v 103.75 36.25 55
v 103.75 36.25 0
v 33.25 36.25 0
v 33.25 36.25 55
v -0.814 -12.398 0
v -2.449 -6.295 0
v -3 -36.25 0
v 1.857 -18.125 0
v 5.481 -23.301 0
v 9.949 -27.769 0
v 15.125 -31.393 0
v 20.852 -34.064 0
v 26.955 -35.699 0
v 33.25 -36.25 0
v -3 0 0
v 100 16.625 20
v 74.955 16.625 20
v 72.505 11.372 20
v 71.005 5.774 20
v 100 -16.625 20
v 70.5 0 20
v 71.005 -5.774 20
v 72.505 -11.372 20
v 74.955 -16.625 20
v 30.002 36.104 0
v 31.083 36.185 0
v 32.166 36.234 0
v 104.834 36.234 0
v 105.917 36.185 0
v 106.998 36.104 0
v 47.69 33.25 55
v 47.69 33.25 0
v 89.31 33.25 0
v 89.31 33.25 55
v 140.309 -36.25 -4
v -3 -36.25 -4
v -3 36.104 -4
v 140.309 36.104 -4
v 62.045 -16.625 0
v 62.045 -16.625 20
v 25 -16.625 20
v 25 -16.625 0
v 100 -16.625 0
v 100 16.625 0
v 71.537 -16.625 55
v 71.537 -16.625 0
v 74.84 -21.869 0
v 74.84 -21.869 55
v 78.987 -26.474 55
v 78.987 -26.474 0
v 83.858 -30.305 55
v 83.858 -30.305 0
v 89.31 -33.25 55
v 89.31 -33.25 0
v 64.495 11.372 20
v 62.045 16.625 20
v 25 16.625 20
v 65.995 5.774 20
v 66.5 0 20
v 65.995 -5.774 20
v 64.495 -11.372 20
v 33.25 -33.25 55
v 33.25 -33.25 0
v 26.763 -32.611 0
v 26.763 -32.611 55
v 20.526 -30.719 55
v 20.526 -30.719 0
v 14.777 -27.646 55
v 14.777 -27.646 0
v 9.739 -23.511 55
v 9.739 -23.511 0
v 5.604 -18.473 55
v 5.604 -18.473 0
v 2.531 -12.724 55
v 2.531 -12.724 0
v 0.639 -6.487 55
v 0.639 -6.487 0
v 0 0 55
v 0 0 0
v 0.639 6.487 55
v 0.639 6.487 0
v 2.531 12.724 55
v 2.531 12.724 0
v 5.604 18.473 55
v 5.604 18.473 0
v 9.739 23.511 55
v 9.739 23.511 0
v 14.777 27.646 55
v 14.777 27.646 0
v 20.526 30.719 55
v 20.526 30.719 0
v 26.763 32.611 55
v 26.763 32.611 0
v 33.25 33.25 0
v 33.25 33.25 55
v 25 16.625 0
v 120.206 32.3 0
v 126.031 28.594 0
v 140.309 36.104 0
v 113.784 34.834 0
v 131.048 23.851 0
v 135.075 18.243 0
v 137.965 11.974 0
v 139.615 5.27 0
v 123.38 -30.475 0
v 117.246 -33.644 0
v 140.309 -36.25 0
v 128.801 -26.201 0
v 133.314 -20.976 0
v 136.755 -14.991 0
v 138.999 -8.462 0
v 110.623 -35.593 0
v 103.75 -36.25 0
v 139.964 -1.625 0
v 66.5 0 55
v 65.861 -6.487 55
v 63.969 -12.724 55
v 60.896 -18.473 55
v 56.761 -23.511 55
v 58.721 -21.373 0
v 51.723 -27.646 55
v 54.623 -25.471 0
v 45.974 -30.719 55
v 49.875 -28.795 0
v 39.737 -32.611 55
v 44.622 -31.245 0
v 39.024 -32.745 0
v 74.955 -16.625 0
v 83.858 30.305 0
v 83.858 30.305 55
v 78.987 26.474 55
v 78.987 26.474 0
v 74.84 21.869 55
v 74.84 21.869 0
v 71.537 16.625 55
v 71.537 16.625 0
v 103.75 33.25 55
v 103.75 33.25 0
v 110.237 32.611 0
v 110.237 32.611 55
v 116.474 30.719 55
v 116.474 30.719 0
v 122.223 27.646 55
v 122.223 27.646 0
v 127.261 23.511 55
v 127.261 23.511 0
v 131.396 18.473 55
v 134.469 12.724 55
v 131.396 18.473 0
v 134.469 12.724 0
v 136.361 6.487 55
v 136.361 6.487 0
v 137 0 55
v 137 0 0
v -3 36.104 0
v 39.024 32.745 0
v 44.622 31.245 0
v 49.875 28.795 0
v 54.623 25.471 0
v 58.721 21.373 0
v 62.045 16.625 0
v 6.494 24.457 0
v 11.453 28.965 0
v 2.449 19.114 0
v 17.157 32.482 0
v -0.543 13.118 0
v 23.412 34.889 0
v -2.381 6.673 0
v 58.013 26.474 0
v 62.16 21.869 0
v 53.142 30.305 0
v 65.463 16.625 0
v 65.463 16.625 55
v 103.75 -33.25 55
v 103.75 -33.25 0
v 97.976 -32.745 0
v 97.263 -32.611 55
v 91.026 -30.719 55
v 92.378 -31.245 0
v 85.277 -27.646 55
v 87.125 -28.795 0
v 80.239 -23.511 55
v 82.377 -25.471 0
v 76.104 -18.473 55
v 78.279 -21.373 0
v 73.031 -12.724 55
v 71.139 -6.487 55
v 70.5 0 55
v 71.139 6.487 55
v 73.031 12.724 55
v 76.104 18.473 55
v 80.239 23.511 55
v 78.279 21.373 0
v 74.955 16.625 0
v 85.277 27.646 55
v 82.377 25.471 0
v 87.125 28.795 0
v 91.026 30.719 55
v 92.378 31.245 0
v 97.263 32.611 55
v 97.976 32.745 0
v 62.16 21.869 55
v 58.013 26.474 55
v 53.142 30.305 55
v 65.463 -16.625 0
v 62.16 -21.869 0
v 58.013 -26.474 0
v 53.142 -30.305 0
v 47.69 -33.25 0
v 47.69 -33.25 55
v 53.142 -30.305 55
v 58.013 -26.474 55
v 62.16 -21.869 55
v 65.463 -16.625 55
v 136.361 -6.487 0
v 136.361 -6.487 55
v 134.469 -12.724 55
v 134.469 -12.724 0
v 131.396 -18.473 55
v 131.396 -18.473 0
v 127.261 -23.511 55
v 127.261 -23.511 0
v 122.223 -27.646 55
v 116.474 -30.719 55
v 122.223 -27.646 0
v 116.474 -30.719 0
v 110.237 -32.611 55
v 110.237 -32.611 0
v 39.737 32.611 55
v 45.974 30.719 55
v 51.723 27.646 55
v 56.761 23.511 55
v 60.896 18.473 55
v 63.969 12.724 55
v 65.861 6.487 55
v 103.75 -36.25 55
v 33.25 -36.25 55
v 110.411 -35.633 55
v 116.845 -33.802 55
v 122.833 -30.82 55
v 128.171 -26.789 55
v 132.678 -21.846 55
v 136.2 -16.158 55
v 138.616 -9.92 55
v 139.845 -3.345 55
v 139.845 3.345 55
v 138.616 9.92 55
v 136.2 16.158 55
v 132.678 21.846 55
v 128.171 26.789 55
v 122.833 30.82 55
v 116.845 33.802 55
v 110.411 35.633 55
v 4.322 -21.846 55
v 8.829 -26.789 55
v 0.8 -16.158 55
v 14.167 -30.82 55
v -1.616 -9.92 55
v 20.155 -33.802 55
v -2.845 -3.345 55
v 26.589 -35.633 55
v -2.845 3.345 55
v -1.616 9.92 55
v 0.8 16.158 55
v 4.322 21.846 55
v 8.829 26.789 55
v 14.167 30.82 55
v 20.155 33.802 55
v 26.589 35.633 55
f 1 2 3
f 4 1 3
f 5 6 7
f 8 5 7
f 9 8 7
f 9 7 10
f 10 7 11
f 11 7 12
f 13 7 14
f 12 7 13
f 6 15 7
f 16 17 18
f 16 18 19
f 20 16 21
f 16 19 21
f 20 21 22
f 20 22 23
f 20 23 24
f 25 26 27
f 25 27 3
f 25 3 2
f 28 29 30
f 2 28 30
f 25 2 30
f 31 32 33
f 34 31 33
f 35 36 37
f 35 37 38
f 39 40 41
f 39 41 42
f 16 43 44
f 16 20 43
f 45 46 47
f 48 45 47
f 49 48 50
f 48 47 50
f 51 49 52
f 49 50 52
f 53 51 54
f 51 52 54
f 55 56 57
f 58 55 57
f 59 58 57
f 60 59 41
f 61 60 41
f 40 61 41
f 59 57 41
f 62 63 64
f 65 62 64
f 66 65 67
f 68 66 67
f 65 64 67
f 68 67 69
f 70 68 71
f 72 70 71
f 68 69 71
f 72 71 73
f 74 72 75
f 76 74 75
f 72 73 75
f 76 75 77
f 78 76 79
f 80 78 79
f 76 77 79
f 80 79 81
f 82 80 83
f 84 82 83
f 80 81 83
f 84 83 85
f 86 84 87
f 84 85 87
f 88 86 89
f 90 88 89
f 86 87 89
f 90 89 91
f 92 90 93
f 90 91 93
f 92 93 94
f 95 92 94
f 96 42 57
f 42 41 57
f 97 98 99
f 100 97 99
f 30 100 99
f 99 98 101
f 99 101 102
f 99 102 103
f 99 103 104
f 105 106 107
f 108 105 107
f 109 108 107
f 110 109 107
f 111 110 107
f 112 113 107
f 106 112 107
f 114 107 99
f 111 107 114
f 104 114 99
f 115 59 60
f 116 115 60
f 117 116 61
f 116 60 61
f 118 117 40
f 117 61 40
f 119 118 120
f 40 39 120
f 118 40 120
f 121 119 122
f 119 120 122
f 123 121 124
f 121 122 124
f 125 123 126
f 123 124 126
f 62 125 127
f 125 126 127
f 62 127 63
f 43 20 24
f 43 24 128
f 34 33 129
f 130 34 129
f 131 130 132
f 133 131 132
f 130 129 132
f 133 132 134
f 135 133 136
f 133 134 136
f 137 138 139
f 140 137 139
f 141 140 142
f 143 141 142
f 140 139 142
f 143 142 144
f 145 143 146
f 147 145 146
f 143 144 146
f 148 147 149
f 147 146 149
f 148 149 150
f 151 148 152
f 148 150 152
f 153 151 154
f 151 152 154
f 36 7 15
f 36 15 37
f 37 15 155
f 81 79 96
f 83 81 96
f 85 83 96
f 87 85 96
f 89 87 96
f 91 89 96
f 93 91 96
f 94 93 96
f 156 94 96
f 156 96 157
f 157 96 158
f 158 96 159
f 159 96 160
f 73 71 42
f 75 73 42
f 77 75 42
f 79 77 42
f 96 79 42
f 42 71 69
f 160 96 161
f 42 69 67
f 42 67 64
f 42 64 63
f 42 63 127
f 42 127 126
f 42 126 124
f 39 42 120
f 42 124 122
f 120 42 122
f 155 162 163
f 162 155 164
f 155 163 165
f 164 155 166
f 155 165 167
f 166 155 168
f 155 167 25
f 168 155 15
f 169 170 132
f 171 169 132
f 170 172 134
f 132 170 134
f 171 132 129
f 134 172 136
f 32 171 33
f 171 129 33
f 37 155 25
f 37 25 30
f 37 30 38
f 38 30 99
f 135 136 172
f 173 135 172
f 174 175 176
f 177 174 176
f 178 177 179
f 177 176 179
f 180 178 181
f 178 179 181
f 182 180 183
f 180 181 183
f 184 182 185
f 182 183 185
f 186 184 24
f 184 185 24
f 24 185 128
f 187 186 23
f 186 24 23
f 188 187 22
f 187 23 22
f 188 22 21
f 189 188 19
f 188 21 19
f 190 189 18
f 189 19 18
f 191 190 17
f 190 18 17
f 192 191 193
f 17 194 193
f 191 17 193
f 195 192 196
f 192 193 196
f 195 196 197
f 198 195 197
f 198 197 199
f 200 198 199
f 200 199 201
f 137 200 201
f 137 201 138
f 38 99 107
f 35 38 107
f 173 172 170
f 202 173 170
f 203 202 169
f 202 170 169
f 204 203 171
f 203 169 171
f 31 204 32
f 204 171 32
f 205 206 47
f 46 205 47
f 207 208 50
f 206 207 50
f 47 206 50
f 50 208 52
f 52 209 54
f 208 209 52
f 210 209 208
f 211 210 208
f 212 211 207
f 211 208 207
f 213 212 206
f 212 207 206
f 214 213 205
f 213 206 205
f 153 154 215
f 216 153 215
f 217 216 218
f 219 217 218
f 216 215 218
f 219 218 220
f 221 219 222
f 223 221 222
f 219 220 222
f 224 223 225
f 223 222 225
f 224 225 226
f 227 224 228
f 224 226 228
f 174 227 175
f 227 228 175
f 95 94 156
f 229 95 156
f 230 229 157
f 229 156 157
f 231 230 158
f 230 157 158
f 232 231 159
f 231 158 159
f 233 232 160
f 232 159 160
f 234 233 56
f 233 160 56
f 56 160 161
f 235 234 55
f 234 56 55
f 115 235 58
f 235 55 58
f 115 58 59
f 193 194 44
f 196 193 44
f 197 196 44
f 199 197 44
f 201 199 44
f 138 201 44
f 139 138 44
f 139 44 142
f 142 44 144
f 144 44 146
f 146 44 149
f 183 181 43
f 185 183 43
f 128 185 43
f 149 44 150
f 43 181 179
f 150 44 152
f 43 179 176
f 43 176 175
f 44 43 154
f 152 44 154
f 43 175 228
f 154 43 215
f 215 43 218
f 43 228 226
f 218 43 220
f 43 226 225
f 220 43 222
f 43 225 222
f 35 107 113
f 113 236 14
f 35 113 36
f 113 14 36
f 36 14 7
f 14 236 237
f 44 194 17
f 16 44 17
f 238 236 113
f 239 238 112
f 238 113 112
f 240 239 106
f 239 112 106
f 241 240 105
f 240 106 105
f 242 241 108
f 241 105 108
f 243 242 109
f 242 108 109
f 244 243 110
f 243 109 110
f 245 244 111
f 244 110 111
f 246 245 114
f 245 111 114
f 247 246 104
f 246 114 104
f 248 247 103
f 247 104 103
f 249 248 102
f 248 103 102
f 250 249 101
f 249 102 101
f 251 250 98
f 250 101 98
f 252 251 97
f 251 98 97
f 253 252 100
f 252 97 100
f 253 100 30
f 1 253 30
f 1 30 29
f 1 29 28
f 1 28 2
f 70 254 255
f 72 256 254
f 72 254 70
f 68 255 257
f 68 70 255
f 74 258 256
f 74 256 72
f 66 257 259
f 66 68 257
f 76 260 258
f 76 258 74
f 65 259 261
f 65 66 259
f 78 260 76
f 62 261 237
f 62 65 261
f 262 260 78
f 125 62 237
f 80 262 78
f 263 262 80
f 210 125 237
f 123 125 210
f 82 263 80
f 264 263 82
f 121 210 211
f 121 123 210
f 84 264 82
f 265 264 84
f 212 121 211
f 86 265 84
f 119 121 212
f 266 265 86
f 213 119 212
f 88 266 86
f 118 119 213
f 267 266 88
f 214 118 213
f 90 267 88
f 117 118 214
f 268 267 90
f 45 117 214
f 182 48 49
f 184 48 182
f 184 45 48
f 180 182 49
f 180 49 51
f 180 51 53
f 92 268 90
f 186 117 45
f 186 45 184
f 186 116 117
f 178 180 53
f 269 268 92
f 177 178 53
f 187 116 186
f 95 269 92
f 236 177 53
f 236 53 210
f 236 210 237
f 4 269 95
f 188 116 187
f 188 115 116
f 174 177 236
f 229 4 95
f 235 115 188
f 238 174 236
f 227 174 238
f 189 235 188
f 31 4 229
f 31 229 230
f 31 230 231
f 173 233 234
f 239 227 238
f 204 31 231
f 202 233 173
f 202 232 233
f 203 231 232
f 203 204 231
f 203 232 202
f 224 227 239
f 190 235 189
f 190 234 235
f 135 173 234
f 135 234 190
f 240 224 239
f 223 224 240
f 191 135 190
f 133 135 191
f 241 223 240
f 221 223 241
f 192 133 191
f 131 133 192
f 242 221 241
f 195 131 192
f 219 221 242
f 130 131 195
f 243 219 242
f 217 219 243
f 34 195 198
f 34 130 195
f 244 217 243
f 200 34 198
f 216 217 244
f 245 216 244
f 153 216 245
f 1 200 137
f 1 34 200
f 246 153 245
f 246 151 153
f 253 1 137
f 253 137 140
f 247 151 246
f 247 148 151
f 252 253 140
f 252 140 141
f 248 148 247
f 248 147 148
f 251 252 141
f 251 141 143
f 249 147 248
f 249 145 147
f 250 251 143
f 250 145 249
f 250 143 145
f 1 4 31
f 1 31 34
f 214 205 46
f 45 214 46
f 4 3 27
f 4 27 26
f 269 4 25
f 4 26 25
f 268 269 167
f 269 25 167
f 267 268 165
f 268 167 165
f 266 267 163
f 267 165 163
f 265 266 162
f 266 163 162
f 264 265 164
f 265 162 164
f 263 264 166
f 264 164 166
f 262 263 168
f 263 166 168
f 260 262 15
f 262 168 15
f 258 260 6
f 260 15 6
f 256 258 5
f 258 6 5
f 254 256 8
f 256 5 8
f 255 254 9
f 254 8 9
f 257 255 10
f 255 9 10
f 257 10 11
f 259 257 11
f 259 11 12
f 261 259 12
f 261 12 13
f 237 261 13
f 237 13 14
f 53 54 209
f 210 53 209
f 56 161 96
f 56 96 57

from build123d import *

# Parameters (mm, degrees)
F2_START = 25
F2_DEPTH = 75
F3_DEPTH = 55
F5_DEPTH = 4


with BuildPart() as f2:
    # F1 (on Right) → F2 (new body)
    with BuildSketch(Plane.YZ.offset(F2_START)):
        Polygon((-16.625, 0), (0, 0), (16.625, 0), (16.625, 20), (-16.625, 20), align=None)
    extrude(amount=F2_DEPTH)

    # F0 (on Top) → F3 (join)
    with BuildSketch(Plane.XY):
        with BuildLine():
            ThreePointArc((33.25, 36.25), (40.6239406019, 35.4920765806), (47.6895290782, 33.25))
            Line((47.6895290782, 33.25), (89.3104709218, 33.25))
            ThreePointArc((89.3104709218, 33.25), (96.3760593981, 35.4920765806), (103.75, 36.25))
            Line((103.75, 36.25), (33.25, 36.25))
        make_face()
        with BuildLine():
            ThreePointArc((65.4629147238, 16.625), (58.0130830961, 26.4736135723), (47.6895290782, 33.25))
            ThreePointArc((47.6895290782, 33.25), (40.6239406019, 35.4920765806), (33.25, 36.25))
            ThreePointArc((33.25, 36.25), (-3, 0), (33.25, -36.25))
            ThreePointArc((33.25, -36.25), (40.6239406019, -35.4920765806), (47.6895290782, -33.25))
            ThreePointArc((47.6895290782, -33.25), (58.0130830961, -26.4736135723), (65.4629147238, -16.625))
            Line((65.4629147238, -16.625), (71.5370852762, -16.625))
            ThreePointArc((71.5370852762, -16.625), (78.9869169039, -26.4736135723), (89.3104709218, -33.25))
            ThreePointArc((89.3104709218, -33.25), (96.3760593981, -35.4920765806), (103.75, -36.25))
            ThreePointArc((103.75, -36.25), (140, 0), (103.75, 36.25))
            ThreePointArc((103.75, 36.25), (96.3760593981, 35.4920765806), (89.3104709218, 33.25))
            ThreePointArc((89.3104709218, 33.25), (78.9869169039, 26.4736135723), (71.5370852762, 16.625))
            Line((71.5370852762, 16.625), (65.4629147238, 16.625))
        make_face()
        with BuildLine():
            ThreePointArc((33.25, -33.25), (0, 0), (33.25, 33.25))
            ThreePointArc((33.25, 33.25), (56.7613004745, 23.5113004745), (66.5, 0))
            ThreePointArc((66.5, 0), (56.7613004745, -23.5113004745), (33.25, -33.25))
        make_face(mode=Mode.SUBTRACT)
        with BuildLine():
            ThreePointArc((137, 0), (127.2613004745, -23.5113004745), (103.75, -33.25))
            ThreePointArc((103.75, -33.25), (70.5, 0), (103.75, 33.25))
            ThreePointArc((103.75, 33.25), (127.2613004745, 23.5113004745), (137, 0))
        make_face(mode=Mode.SUBTRACT)
        with BuildLine():
            ThreePointArc((47.6895290782, -33.25), (40.6239406019, -35.4920765806), (33.25, -36.25))
            Line((33.25, -36.25), (103.75, -36.25))
            ThreePointArc((103.75, -36.25), (96.3760593981, -35.4920765806), (89.3104709218, -33.25))
            Line((89.3104709218, -33.25), (47.6895290782, -33.25))
        make_face()
    extrude(amount=F3_DEPTH)

    # F4 (on face) → F5 (join)
    with BuildSketch(Plane(origin=(0, 0, 0), x_dir=(1, 0, 0), z_dir=(0, 0, -1))):
        with BuildLine():
            Line((103.75, 36.25), (33.25, 36.25))
            ThreePointArc((33.25, 36.25), (7.6173792195, 25.6326208556), (-3, 1.062e-07))
            ThreePointArc((-3, 1.062e-07), (6.493803342, -24.4574822989), (30.0023968175, -36.1042320728))
            Line((30.0023968175, -36.1042320728), (106.9976031825, -36.1042320728))
            ThreePointArc((106.9976031825, -36.1042320728), (139.9635396823, 1.6254364583), (103.75, 36.25))
        make_face()
        with BuildLine():
            ThreePointArc((47.6895290782, -33.25), (58.0130830961, -26.4736135723), (65.4629147238, -16.625))
            Line((65.4629147238, -16.625), (71.5370852762, -16.625))
            ThreePointArc((71.5370852762, -16.625), (78.9869169039, -26.4736135723), (89.3104709218, -33.25))
            Line((89.3104709218, -33.25), (47.6895290782, -33.25))
        make_face(mode=Mode.SUBTRACT)
        with BuildLine():
            Line((100, 16.625), (74.9546553242, 16.625))
            ThreePointArc((74.9546553242, 16.625), (132.5453446758, 16.625), (103.75, -33.25))
            ThreePointArc((103.75, -33.25), (87.125, -28.7953446758), (74.9546553242, -16.625))
            Line((74.9546553242, -16.625), (100, -16.625))
            Line((100, -16.625), (100, 16.625))
        make_face(mode=Mode.SUBTRACT)
        with BuildLine():
            Line((25, -16.625), (62.0453446758, -16.625))
            ThreePointArc((62.0453446758, -16.625), (4.4546553242, -16.625), (33.25, 33.25))
            ThreePointArc((33.25, 33.25), (49.875, 28.7953446758), (62.0453446758, 16.625))
            Line((62.0453446758, 16.625), (25, 16.625))
            Line((25, 16.625), (25, -16.625))
        make_face(mode=Mode.SUBTRACT)
        with BuildLine():
            ThreePointArc((89.3104709218, 33.25), (78.9869169039, 26.4736135723), (71.5370852762, 16.625))
            Line((71.5370852762, 16.625), (65.4629147238, 16.625))
            ThreePointArc((65.4629147238, 16.625), (58.0130830961, 26.4736135723), (47.6895290782, 33.25))
            Line((47.6895290782, 33.25), (89.3104709218, 33.25))
        make_face(mode=Mode.SUBTRACT)
        with BuildLine():
            Line((33.25, 36.25), (-3, 36.25))
            Line((-3, 36.25), (-3, 1.062e-07))
            ThreePointArc((-3, 1.062e-07), (7.6173792195, 25.6326208556), (33.25, 36.25))
        make_face()
        with BuildLine():
            Line((140.309497714, 36.25), (103.75, 36.25))
            ThreePointArc((103.75, 36.25), (139.9635396823, 1.6254364583), (106.9976031825, -36.1042320728))
            Line((106.9976031825, -36.1042320728), (140.309497714, -36.1042320728))
            Line((140.309497714, -36.1042320728), (140.309497714, 36.25))
        make_face()
        with BuildLine():
            Line((65.4629147238, 16.625), (71.5370852762, 16.625))
            ThreePointArc((71.5370852762, 16.625), (78.9869169039, 26.4736135723), (89.3104709218, 33.25))
            Line((89.3104709218, 33.25), (47.6895290782, 33.25))
            ThreePointArc((47.6895290782, 33.25), (58.0130830961, 26.4736135723), (65.4629147238, 16.625))
        make_face()
        with BuildLine():
            ThreePointArc((33.25, 33.25), (4.4546553242, -16.625), (62.0453446758, -16.625))
            Line((62.0453446758, -16.625), (25, -16.625))
            Line((25, -16.625), (25, 16.625))
            Line((25, 16.625), (62.0453446758, 16.625))
            ThreePointArc((62.0453446758, 16.625), (49.875, 28.7953446758), (33.25, 33.25))
        make_face()
        with BuildLine():
            ThreePointArc((103.75, -33.25), (132.5453446758, 16.625), (74.9546553242, 16.625))
            Line((74.9546553242, 16.625), (100, 16.625))
            Line((100, 16.625), (100, -16.625))
            Line((100, -16.625), (74.9546553242, -16.625))
            ThreePointArc((74.9546553242, -16.625), (87.125, -28.7953446758), (103.75, -33.25))
        make_face()
        with BuildLine():
            Line((71.5370852762, -16.625), (65.4629147238, -16.625))
            ThreePointArc((65.4629147238, -16.625), (58.0130830961, -26.4736135723), (47.6895290782, -33.25))
            Line((47.6895290782, -33.25), (89.3104709218, -33.25))
            ThreePointArc((89.3104709218, -33.25), (78.9869169039, -26.4736135723), (71.5370852762, -16.625))
        make_face()
        with BuildLine():
            ThreePointArc((30.0023968175, -36.1042320728), (6.493803342, -24.4574822989), (-3, 1.062e-07))
            Line((-3, 1.062e-07), (-3, -36.1042320728))
            Line((-3, -36.1042320728), (30.0023968175, -36.1042320728))
        make_face()
    extrude(amount=F5_DEPTH)


solid = f2.part
